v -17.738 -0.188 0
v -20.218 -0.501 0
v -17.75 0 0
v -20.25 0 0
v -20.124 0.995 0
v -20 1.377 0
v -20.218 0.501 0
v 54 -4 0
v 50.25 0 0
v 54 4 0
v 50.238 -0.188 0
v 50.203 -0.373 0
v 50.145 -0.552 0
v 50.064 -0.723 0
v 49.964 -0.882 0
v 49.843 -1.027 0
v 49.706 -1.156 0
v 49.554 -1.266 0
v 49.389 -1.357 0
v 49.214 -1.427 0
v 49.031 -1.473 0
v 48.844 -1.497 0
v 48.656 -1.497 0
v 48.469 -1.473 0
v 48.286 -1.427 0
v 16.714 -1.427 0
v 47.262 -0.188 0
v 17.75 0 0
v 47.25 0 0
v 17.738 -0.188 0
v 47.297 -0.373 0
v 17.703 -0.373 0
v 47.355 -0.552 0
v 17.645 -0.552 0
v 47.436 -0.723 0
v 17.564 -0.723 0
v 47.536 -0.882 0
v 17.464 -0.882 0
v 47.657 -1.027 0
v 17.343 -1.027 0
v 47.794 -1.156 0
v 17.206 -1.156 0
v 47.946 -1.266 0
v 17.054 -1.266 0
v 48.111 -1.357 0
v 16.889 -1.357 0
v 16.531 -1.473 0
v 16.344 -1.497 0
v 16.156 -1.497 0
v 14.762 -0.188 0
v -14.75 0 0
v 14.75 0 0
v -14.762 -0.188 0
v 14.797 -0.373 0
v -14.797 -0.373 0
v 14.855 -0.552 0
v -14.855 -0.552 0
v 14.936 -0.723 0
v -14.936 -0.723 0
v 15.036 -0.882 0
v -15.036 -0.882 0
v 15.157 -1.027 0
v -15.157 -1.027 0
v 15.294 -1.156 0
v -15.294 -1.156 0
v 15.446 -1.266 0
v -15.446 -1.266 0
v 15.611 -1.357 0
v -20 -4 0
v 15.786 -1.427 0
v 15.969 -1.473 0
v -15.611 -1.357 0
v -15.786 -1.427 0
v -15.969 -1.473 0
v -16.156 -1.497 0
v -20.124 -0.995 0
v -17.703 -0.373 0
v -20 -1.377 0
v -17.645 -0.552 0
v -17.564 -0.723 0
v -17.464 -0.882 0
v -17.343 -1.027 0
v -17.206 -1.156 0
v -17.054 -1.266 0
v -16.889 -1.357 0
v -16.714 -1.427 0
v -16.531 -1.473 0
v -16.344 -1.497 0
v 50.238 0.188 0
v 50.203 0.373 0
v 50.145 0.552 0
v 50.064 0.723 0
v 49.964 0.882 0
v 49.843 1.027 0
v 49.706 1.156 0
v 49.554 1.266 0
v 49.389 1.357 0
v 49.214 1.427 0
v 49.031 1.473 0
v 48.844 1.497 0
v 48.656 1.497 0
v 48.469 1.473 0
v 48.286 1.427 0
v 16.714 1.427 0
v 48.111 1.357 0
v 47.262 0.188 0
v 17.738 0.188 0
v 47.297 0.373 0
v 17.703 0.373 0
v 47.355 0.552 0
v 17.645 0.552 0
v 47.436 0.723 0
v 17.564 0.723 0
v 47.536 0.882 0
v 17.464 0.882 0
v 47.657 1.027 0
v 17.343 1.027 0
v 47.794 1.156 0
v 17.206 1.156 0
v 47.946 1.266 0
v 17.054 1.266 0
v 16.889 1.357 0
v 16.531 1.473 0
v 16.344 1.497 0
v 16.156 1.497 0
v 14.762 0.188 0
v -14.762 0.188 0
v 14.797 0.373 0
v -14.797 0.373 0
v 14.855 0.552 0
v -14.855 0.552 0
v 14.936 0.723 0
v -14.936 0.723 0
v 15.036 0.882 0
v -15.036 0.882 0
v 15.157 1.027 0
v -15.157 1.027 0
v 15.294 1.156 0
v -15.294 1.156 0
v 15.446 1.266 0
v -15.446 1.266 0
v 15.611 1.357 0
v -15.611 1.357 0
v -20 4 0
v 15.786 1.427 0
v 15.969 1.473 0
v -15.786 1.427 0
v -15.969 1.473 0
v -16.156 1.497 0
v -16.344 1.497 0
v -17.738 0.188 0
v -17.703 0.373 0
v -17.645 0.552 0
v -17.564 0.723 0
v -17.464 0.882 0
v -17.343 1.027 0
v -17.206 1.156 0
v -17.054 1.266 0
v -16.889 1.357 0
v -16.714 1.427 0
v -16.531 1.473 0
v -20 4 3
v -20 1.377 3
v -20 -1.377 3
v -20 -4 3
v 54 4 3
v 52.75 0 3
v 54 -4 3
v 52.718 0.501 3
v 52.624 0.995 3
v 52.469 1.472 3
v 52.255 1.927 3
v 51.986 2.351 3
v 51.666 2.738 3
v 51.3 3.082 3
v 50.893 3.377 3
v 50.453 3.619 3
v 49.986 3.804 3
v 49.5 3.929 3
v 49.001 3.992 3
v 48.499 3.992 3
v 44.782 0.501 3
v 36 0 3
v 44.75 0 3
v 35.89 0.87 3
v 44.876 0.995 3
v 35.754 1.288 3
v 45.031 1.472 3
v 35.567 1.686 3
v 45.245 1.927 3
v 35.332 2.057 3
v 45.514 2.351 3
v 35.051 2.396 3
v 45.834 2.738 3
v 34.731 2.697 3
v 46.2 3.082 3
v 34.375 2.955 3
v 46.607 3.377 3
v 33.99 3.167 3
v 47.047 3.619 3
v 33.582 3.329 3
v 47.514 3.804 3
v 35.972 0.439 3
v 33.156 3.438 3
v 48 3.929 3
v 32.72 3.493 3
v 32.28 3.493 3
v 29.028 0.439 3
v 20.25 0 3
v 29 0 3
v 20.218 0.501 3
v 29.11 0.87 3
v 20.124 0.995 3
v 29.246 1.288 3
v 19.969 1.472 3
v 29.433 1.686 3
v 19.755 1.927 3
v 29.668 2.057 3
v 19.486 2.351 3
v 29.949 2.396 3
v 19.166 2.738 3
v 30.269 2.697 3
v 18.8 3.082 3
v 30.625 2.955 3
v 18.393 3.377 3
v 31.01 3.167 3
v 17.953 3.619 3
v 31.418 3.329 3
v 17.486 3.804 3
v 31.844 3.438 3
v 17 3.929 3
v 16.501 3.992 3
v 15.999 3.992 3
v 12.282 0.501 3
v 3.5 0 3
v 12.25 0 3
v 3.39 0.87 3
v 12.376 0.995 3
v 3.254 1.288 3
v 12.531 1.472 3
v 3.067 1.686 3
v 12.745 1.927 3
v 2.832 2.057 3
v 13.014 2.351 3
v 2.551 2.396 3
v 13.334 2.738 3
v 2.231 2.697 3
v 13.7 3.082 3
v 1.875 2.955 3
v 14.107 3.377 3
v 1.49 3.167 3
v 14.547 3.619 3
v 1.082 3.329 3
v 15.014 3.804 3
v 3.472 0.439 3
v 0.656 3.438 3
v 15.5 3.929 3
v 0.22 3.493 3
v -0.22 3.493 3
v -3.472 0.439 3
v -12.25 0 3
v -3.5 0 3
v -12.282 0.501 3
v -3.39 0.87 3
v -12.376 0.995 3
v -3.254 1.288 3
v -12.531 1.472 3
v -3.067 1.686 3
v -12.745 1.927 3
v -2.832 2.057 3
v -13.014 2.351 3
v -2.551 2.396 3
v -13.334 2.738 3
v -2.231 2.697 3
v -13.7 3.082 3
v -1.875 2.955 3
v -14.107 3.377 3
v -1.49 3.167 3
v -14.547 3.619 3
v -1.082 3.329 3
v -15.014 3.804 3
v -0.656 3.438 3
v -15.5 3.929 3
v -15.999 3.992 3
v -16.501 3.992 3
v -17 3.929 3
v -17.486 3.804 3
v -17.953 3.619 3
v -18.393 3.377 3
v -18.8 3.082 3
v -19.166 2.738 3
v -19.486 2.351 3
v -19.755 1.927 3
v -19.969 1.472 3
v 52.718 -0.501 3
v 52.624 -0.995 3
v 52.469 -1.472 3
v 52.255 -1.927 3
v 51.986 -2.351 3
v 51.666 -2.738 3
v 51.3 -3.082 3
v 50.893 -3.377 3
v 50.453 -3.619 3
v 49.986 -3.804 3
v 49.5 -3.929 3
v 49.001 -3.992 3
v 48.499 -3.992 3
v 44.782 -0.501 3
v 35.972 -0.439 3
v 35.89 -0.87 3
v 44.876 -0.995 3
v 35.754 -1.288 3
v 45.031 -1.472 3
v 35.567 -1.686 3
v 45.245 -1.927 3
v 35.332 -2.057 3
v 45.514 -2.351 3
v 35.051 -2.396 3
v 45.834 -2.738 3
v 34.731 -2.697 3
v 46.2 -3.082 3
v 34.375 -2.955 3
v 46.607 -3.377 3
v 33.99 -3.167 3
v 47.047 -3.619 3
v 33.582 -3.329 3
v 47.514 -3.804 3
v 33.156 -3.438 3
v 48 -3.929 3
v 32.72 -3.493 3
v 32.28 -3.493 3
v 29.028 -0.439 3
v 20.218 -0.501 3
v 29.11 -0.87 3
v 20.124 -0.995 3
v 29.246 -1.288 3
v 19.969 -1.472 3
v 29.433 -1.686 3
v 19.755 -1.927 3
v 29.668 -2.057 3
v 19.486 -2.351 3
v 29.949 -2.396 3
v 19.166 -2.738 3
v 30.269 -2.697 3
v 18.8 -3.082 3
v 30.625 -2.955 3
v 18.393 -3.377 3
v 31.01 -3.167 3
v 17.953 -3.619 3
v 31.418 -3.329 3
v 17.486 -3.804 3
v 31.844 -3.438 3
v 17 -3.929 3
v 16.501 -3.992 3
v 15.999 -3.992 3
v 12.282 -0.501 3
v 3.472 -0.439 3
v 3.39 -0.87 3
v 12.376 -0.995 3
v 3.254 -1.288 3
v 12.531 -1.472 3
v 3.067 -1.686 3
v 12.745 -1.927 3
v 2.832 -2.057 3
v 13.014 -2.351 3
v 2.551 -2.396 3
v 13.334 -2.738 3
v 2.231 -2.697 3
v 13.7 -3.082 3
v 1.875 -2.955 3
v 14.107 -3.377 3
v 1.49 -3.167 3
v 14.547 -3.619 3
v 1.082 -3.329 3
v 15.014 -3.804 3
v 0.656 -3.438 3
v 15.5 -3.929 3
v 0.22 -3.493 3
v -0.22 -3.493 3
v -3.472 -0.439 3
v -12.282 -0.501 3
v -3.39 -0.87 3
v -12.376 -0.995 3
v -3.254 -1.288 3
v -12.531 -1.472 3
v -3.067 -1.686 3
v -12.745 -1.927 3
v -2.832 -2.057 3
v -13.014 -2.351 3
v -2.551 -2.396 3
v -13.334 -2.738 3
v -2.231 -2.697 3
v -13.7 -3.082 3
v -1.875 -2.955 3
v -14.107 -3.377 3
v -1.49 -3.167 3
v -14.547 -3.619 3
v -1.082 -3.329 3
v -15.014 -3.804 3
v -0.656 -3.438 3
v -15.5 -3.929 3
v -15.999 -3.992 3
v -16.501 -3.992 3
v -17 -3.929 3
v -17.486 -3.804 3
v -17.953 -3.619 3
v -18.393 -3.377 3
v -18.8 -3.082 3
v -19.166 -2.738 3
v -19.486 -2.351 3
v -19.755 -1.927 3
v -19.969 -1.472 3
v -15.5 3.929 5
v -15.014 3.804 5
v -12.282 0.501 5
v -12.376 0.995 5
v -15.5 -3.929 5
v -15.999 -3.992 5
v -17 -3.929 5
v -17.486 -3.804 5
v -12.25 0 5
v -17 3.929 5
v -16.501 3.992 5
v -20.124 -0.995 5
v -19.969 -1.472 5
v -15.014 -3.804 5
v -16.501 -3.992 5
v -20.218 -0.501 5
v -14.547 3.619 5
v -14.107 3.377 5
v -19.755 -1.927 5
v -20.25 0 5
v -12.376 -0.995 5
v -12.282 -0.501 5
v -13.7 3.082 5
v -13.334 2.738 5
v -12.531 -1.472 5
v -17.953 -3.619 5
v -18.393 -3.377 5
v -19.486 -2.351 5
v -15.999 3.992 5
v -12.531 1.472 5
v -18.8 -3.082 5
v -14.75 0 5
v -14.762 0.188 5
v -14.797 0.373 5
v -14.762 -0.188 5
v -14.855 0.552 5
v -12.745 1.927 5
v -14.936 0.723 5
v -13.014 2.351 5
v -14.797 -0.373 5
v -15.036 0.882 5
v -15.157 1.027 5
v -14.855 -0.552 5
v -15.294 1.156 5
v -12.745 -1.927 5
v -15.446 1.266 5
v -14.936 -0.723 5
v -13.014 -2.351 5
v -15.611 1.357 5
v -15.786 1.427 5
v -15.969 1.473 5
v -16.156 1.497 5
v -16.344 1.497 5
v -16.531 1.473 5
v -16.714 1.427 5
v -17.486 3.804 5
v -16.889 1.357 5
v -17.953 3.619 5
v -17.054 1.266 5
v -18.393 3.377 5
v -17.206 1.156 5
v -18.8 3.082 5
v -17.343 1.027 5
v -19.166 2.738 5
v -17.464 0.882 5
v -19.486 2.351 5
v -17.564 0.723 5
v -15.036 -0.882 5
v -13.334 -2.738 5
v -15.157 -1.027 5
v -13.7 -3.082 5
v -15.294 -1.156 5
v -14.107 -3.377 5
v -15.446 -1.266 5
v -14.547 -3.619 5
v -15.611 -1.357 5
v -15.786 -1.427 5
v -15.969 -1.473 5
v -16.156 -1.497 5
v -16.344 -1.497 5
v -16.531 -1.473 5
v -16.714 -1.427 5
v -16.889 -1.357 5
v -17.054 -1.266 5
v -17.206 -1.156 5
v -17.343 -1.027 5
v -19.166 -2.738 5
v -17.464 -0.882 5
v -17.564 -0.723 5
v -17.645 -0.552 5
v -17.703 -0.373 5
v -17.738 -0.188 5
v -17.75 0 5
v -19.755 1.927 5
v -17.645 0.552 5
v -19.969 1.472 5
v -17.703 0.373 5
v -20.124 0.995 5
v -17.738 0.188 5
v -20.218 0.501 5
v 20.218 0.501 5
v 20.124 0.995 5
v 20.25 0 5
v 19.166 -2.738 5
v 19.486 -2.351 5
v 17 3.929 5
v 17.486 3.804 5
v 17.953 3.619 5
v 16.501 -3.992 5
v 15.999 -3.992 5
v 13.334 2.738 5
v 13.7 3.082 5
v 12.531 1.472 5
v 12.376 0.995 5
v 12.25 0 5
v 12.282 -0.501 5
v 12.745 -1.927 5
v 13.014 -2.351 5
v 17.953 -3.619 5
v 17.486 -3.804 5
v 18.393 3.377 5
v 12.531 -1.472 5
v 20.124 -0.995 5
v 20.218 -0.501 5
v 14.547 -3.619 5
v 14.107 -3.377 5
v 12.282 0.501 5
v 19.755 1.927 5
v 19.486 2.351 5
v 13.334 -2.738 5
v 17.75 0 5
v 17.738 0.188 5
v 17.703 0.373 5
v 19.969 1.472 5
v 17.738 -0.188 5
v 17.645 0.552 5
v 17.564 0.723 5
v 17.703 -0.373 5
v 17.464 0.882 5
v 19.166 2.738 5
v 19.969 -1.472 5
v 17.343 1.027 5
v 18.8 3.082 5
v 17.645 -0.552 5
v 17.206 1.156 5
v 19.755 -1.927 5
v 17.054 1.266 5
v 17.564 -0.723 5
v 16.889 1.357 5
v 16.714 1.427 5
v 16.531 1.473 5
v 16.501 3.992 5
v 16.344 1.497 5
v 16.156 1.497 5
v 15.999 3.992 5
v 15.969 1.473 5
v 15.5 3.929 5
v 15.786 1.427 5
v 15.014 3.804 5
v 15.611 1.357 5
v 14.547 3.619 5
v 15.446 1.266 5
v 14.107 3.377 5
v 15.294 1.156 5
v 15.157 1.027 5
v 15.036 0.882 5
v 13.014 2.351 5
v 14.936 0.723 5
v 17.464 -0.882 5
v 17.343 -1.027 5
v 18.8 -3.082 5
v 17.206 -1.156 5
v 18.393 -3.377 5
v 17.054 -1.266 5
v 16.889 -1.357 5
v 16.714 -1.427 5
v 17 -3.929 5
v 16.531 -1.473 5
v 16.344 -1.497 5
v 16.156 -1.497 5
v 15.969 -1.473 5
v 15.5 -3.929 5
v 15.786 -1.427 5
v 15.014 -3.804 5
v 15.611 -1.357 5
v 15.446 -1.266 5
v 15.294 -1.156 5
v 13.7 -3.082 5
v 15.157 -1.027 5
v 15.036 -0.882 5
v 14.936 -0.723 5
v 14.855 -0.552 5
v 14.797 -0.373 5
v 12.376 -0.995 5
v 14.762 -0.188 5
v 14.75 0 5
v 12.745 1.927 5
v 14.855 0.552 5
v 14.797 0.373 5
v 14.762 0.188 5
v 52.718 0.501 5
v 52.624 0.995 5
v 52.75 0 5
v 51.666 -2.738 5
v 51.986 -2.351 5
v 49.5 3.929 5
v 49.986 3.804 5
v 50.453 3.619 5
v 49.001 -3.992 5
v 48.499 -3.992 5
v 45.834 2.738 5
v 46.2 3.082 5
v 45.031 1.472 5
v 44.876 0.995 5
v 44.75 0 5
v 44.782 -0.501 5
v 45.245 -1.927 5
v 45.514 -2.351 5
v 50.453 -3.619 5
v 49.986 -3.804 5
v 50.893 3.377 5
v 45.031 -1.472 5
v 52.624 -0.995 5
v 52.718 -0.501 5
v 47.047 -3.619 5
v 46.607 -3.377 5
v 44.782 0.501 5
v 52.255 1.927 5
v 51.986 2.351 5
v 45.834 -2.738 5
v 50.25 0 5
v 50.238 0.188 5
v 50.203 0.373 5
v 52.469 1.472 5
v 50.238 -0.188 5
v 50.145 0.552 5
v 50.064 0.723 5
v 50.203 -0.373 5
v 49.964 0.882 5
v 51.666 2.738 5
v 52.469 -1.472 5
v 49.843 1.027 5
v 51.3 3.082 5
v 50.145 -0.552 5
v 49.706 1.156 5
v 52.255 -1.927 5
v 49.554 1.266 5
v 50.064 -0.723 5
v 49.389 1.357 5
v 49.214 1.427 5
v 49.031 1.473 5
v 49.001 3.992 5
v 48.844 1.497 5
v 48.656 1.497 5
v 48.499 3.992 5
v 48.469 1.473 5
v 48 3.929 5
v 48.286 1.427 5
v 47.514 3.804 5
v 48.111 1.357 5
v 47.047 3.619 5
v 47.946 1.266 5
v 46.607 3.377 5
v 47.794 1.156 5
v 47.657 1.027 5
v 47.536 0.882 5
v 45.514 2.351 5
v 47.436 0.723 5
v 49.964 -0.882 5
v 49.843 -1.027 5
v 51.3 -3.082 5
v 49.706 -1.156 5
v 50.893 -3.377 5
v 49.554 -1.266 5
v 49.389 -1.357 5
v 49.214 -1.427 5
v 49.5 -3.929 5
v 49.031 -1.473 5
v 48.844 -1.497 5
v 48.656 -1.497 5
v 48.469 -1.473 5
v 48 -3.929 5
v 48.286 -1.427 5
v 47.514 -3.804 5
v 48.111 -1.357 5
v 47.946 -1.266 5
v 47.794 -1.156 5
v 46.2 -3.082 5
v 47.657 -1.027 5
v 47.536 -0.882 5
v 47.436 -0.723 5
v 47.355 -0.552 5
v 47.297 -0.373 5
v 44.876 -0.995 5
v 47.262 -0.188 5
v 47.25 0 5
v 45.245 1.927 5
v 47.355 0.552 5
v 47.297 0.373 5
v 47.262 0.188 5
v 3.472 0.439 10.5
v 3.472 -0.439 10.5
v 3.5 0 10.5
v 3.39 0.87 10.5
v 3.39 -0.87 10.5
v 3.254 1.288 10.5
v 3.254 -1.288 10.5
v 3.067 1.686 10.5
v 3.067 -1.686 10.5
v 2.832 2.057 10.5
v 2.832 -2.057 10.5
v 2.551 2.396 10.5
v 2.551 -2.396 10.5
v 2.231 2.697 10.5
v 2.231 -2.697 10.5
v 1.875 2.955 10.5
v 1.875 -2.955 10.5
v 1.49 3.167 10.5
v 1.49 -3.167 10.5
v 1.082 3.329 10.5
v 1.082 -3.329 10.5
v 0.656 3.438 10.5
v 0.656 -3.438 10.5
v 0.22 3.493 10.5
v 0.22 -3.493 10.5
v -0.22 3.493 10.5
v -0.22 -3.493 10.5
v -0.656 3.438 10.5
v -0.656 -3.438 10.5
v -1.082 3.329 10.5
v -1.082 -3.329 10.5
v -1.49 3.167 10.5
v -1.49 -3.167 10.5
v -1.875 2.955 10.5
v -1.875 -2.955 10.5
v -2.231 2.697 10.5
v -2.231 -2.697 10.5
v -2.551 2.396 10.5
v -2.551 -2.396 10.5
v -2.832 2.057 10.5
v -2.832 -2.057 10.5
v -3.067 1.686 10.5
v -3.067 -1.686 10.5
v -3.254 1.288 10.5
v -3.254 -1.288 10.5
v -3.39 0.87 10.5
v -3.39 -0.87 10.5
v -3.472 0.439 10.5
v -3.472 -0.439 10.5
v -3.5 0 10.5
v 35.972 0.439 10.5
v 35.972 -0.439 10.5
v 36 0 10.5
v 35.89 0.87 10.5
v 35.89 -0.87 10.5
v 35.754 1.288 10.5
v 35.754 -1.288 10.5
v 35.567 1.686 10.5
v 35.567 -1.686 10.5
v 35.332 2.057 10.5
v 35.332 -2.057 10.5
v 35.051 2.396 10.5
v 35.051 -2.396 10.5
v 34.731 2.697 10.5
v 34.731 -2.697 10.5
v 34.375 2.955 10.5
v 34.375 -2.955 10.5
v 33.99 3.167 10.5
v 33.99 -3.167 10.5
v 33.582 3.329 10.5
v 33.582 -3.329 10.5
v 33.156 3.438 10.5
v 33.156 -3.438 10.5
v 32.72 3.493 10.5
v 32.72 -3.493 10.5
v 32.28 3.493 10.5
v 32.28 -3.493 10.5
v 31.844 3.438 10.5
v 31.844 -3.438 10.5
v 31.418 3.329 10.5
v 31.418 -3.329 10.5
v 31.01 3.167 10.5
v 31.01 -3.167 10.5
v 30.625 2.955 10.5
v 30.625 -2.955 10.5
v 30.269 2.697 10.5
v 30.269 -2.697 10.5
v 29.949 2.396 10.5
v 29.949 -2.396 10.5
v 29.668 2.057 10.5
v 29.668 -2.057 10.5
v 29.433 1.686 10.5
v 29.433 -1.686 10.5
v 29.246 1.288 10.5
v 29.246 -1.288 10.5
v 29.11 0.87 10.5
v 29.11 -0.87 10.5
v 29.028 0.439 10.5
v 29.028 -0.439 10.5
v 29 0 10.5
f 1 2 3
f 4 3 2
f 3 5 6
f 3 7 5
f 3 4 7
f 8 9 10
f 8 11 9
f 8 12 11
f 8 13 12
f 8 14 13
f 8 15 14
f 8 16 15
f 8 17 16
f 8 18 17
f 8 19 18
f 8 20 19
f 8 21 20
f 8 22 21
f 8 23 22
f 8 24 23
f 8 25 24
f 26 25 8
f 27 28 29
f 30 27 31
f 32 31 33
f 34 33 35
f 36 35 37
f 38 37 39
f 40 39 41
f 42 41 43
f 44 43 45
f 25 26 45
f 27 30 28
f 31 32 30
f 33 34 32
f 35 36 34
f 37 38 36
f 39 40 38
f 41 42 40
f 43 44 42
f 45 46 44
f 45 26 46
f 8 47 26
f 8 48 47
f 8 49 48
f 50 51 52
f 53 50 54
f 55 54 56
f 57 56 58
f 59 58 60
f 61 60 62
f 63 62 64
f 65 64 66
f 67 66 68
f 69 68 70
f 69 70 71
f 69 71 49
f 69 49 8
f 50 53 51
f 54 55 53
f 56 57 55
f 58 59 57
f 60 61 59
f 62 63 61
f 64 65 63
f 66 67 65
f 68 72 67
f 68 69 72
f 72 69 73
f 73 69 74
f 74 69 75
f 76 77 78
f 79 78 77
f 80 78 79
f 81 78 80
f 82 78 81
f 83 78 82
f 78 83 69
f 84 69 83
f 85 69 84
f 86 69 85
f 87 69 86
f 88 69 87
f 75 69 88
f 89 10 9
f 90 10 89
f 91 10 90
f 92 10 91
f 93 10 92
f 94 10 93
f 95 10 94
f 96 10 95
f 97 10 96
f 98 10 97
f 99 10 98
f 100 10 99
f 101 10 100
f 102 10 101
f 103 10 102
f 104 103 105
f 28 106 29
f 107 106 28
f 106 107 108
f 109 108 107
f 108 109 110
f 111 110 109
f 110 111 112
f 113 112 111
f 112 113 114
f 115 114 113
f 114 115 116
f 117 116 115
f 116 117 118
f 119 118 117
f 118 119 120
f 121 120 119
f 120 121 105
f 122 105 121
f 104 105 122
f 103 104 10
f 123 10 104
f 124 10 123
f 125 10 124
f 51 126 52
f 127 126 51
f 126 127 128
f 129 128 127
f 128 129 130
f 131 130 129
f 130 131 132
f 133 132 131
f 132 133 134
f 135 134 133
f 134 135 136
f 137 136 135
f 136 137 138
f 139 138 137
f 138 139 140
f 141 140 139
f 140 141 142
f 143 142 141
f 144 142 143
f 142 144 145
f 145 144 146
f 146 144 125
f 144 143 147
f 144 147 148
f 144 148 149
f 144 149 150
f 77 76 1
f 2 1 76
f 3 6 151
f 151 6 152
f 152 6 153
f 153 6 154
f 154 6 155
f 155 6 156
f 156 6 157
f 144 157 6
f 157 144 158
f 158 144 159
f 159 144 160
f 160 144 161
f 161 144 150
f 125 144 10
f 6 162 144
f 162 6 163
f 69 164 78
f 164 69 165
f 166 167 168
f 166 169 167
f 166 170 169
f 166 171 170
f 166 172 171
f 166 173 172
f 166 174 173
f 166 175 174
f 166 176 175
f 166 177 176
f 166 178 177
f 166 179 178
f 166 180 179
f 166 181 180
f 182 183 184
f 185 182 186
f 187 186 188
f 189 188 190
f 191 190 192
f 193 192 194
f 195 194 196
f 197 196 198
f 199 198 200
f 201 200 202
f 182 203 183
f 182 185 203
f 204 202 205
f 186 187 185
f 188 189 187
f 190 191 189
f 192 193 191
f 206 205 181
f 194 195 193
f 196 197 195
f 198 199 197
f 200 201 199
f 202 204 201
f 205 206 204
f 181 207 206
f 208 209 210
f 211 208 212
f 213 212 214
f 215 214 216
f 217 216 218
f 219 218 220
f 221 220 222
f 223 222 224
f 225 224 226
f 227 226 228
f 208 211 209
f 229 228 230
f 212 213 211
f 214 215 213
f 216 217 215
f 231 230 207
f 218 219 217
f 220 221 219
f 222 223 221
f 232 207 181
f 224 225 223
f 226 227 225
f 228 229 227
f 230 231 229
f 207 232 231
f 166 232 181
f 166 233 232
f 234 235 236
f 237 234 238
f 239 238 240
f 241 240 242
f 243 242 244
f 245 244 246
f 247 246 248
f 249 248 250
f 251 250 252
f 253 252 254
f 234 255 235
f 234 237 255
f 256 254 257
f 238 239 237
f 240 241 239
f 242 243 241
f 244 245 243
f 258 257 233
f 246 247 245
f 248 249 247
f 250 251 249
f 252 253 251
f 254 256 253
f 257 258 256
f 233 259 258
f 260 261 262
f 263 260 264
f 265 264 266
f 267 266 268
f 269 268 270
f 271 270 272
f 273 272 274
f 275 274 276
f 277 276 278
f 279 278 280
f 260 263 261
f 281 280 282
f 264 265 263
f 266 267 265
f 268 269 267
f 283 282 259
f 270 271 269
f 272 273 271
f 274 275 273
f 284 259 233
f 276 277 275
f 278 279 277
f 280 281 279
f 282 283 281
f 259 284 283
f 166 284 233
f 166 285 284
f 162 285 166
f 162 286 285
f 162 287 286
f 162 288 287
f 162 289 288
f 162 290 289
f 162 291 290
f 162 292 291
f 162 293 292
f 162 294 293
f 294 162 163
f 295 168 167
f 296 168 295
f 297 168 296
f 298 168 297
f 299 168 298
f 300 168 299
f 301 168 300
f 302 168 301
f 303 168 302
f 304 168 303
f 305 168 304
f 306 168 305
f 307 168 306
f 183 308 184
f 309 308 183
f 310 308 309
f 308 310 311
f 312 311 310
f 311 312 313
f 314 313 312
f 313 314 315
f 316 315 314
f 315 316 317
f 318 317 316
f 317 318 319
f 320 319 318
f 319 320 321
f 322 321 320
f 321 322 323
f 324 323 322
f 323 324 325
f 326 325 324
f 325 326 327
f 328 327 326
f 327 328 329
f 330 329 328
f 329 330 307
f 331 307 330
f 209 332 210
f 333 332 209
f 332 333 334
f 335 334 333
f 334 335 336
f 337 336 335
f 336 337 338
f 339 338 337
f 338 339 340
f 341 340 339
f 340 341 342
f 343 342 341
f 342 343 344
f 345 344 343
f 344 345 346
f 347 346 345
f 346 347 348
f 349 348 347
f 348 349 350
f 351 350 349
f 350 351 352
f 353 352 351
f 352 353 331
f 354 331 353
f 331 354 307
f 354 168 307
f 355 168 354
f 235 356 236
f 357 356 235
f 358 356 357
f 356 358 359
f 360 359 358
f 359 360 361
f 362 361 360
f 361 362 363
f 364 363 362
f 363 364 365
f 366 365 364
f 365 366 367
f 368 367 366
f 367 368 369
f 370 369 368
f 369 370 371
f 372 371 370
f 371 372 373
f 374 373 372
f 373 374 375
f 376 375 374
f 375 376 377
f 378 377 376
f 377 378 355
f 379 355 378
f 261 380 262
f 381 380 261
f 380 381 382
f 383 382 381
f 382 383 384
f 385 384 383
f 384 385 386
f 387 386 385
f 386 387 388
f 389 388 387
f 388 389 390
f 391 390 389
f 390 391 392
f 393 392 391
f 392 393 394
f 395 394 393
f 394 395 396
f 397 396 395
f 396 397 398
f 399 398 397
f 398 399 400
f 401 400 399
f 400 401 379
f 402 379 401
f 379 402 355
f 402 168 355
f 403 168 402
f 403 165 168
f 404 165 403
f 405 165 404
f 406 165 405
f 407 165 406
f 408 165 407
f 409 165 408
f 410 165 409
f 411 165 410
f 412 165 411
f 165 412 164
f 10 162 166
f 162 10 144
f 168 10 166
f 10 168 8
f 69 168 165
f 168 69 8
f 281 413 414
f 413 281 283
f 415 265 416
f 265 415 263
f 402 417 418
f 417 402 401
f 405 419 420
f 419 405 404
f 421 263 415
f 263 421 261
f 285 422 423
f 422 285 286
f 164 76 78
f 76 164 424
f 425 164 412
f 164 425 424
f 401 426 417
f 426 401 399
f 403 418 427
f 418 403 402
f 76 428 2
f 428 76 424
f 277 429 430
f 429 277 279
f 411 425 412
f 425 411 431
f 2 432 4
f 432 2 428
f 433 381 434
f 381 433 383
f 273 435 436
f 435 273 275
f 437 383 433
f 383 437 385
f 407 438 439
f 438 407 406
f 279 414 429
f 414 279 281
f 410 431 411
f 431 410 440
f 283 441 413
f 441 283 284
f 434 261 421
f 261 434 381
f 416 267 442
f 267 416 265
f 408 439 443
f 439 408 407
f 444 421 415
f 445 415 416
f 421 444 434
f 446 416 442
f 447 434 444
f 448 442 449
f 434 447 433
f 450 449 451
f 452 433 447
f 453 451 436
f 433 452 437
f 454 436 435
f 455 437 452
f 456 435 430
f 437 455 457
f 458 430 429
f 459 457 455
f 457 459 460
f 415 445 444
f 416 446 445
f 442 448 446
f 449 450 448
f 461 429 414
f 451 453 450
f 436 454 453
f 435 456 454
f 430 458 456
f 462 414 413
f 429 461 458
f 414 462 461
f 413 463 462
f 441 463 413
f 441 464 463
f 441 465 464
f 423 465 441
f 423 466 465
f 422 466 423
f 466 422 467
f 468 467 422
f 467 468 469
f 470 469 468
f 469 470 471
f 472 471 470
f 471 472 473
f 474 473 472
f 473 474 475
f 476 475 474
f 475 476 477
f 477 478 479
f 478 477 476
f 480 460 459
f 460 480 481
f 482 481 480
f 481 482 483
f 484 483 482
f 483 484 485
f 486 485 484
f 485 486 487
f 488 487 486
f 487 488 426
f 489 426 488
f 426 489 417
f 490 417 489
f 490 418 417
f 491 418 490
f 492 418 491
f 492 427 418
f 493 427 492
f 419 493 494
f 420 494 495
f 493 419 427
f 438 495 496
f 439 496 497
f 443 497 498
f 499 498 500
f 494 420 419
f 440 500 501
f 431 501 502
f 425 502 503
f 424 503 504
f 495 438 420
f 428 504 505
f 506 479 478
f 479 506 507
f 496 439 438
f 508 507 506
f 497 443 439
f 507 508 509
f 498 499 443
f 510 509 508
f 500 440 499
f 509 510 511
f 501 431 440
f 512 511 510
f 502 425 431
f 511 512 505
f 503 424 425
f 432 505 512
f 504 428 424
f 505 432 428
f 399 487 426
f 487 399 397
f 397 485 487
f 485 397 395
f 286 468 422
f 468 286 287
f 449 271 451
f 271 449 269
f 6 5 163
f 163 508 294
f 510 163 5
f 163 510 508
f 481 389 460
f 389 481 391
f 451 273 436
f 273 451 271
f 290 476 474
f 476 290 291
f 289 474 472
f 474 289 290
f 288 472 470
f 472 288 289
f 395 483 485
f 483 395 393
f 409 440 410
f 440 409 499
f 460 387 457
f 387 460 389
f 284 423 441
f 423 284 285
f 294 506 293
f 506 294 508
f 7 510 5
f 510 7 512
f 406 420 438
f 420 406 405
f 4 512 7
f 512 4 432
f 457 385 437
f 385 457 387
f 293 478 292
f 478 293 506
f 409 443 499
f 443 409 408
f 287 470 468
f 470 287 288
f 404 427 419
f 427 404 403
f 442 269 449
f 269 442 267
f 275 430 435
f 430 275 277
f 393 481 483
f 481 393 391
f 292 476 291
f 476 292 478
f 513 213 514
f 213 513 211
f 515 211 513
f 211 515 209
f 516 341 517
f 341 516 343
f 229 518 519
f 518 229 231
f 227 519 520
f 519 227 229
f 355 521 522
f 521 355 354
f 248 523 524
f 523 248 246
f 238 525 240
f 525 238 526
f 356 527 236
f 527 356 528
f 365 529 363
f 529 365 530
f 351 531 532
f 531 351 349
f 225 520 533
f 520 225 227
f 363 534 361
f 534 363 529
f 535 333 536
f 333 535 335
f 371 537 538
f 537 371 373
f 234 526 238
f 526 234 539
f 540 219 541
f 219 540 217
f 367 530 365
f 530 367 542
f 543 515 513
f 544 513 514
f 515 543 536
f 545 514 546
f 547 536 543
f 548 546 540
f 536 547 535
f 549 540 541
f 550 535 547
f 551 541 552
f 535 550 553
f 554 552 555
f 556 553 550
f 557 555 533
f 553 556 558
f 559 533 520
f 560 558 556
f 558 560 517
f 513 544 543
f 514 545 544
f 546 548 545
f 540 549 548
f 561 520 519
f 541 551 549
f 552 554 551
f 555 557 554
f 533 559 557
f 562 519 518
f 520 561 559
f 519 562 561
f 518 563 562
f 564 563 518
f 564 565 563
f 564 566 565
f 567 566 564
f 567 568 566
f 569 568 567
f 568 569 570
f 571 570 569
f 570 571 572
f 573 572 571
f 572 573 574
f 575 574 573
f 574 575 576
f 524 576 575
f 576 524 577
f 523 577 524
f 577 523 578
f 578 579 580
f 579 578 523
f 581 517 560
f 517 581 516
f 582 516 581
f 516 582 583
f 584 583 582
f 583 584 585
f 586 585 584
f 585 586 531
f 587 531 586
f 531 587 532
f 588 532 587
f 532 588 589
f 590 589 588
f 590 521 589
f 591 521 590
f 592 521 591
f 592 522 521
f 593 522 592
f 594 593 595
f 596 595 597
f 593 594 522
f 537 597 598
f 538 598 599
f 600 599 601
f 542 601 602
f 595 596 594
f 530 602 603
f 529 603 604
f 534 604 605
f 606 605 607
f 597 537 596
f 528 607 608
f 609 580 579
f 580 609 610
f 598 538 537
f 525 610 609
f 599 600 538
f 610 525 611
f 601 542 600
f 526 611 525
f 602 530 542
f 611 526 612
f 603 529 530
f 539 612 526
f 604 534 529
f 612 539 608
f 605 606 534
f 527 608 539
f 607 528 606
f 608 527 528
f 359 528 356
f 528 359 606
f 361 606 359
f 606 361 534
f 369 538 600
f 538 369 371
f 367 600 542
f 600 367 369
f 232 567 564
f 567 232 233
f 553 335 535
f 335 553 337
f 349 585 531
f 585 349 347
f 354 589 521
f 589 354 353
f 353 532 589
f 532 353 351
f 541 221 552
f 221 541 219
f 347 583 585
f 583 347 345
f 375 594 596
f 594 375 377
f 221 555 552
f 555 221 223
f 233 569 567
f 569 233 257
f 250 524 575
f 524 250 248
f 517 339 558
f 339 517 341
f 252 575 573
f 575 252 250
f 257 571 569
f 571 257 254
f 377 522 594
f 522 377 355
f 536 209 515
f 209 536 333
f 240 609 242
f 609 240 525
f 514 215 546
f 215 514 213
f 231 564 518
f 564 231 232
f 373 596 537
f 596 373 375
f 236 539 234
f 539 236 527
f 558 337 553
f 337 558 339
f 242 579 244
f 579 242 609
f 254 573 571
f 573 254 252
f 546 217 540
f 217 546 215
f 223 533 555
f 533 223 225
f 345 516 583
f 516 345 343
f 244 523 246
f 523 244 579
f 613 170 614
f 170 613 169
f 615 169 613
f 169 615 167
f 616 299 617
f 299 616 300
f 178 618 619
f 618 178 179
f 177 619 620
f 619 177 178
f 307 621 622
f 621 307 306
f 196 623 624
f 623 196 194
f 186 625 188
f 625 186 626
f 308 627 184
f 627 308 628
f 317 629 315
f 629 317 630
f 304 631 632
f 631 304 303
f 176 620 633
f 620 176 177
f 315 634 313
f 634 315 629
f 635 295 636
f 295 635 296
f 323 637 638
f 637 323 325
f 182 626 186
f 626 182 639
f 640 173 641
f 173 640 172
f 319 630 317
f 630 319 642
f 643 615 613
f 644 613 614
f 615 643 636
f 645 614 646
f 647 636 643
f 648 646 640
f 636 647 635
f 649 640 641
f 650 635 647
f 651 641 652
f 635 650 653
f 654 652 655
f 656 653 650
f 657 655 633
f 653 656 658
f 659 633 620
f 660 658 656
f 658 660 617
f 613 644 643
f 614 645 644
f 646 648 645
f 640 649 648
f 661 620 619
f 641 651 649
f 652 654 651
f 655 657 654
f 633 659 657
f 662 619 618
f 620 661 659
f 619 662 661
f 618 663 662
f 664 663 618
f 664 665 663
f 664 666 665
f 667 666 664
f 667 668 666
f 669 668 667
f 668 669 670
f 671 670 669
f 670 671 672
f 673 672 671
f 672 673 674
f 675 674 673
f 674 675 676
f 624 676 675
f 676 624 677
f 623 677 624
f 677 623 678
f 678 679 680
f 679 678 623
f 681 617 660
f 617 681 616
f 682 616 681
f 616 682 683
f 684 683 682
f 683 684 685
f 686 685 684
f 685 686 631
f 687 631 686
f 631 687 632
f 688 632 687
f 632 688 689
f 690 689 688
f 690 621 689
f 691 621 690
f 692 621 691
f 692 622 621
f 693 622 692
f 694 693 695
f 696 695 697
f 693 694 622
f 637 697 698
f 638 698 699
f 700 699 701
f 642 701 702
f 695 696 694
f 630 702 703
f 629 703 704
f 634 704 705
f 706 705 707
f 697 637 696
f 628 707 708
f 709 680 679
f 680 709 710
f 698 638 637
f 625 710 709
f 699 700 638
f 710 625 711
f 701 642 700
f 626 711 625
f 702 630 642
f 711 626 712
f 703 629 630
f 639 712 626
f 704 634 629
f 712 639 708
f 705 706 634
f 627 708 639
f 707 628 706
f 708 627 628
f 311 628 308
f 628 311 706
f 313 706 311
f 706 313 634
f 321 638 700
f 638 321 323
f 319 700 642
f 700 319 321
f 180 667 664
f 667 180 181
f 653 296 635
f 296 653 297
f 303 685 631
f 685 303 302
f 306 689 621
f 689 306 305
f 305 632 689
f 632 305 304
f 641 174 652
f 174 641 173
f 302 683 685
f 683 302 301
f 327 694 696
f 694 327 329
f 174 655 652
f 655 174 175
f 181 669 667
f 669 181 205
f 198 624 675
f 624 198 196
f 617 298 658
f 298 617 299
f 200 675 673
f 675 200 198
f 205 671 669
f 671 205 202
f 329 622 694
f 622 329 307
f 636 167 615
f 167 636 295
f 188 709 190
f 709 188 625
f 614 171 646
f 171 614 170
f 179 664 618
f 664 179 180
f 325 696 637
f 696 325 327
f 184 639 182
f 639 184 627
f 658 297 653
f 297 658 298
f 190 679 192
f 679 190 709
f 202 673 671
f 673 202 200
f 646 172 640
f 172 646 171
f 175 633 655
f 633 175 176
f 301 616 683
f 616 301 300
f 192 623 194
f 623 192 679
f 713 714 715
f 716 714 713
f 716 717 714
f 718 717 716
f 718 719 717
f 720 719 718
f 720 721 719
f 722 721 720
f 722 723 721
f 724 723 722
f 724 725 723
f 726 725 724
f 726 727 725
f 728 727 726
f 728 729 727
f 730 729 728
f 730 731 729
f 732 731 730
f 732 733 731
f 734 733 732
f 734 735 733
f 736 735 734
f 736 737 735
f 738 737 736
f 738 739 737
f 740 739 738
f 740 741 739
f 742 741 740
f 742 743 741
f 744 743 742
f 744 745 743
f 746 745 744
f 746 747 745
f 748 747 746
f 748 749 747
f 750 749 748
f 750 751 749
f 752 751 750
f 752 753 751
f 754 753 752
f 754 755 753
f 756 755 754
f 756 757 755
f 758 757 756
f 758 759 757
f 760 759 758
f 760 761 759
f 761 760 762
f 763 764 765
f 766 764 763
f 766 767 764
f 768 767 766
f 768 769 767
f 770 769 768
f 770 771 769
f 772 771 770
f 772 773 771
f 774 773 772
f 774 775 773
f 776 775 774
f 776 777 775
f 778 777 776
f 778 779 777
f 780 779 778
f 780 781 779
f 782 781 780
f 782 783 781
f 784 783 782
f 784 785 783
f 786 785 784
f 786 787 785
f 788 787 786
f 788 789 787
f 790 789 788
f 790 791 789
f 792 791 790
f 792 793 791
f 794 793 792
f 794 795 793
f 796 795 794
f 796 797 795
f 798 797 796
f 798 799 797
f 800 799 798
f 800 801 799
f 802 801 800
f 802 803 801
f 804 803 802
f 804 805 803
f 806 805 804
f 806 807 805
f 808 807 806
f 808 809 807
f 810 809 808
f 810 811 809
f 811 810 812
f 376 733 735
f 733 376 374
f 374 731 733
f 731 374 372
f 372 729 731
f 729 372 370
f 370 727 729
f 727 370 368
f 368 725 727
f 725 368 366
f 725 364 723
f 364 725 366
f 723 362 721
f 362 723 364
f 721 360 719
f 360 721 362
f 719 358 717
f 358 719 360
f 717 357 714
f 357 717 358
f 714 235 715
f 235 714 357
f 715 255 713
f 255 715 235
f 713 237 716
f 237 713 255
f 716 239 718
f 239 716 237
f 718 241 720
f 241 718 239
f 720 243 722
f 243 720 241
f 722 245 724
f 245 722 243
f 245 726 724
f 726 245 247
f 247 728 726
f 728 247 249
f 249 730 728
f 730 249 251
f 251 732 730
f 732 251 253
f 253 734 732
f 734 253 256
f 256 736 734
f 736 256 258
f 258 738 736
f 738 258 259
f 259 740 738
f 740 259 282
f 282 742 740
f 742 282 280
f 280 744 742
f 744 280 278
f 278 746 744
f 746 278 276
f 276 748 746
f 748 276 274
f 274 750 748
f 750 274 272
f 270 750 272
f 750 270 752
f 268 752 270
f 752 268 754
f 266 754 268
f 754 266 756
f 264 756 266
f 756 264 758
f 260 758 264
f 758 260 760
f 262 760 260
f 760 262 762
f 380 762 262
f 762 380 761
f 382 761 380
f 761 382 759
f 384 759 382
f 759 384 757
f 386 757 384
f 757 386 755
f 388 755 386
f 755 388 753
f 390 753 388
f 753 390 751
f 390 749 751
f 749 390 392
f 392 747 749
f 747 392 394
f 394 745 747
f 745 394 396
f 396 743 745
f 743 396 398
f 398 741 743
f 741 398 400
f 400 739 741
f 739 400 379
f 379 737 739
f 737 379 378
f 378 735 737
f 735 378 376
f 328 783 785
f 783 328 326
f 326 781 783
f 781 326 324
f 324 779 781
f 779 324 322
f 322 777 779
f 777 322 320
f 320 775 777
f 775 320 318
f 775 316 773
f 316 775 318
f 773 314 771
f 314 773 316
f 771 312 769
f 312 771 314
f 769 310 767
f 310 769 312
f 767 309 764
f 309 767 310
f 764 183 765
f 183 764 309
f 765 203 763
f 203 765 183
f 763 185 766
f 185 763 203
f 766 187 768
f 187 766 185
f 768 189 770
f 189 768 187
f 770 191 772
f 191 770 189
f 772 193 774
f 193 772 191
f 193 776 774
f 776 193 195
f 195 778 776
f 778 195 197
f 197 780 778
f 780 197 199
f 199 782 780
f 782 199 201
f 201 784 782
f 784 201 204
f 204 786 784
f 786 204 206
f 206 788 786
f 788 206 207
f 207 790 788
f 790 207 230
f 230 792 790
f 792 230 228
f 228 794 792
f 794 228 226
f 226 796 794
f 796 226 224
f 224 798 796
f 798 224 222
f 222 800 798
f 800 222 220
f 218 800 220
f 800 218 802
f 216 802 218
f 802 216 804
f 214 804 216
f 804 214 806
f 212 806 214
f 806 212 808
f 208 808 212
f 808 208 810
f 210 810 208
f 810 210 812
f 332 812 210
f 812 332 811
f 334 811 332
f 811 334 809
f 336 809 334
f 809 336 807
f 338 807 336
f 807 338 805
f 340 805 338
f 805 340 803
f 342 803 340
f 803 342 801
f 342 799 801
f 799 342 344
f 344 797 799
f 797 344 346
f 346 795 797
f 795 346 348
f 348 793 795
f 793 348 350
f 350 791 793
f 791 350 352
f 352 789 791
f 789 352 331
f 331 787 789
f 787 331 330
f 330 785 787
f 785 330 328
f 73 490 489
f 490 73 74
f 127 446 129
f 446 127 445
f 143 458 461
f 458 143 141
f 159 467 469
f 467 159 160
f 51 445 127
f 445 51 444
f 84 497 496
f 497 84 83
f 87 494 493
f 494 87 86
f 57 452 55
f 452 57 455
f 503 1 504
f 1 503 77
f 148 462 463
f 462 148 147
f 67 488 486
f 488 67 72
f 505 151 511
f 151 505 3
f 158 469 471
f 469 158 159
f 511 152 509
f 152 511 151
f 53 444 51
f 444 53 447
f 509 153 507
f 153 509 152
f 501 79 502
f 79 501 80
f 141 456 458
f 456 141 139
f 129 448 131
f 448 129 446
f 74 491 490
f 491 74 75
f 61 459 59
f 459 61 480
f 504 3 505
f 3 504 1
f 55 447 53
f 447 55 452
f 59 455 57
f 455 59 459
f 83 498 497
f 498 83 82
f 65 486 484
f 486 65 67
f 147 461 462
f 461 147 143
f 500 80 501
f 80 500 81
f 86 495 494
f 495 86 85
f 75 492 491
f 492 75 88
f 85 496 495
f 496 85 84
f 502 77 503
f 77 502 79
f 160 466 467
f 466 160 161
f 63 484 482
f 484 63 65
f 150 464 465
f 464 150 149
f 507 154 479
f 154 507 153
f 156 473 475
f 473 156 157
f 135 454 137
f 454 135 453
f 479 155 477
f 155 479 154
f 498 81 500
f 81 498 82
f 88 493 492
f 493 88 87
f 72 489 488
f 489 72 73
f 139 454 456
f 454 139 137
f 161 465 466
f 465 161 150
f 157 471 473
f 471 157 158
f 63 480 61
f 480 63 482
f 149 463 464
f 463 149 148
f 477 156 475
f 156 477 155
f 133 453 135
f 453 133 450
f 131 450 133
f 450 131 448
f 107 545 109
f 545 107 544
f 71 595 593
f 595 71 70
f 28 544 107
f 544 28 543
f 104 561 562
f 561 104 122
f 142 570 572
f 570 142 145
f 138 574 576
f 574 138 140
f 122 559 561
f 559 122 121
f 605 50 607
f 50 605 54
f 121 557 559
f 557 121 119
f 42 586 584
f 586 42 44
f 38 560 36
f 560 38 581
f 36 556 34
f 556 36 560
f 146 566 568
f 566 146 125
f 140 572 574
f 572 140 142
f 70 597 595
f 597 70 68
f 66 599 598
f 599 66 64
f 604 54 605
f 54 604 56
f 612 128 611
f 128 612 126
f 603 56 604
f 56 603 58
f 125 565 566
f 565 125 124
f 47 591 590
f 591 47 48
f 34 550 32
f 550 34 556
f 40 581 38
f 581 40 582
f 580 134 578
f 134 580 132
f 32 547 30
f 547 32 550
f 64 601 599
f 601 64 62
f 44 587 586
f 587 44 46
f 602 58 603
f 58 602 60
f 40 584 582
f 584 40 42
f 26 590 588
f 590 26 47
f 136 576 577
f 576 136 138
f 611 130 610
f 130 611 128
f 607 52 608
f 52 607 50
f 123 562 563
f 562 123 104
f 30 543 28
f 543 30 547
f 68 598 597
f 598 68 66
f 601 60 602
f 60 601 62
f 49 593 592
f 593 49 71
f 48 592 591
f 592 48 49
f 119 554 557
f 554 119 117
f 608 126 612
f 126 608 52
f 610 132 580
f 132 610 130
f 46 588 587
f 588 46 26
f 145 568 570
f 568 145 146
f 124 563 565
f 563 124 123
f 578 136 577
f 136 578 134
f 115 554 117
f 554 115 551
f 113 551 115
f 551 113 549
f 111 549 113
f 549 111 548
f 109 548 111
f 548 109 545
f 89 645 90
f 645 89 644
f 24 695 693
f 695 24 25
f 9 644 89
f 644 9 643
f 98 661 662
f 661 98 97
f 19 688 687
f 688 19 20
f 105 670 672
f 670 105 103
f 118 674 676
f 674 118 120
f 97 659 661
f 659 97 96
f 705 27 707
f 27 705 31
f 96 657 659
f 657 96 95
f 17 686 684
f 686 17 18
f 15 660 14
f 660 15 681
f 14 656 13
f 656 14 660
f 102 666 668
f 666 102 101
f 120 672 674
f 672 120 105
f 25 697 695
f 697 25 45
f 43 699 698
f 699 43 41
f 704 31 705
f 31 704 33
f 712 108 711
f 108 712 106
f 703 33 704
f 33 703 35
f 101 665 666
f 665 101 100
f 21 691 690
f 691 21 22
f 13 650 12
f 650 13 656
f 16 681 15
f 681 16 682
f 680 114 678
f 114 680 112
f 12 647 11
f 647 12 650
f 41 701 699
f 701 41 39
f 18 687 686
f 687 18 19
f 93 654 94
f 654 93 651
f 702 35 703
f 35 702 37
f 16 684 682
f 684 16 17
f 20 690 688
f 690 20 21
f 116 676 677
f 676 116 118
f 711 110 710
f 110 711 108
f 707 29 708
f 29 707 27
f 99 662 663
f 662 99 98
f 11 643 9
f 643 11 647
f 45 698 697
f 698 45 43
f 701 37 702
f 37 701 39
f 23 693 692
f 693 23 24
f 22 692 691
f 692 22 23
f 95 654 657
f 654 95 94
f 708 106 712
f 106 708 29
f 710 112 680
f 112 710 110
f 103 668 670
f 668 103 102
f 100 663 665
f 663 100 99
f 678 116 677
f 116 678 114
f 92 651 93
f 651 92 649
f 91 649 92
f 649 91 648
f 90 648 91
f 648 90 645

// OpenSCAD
$fn = 50;

width = 15;

module box() {
    linear_extrude(height=3)
    translate([-40/2, -4])
    square([17.5 + width + 16.5 + width + 10, 8]);
    
    translate([-(17.5+width)/2, 0])
    nut();
    translate([(17.5+width)/2, 0])
    nut();
    translate([17.5+width+(17.5+width)/2, 0])
    nut();
    
    linear_extrude(height=7.5+3)
    union() {
        circle(d=7);
        translate([17.5 + width, 0])
        circle(d=7);
    }
}

module nut() {
    linear_extrude(height=3+2)
    circle(d=8);
}

module nut_hole() {
    linear_extrude(height=3+2)
    circle(d=3);
}

module nut_holes() {
    translate([-(17.5+width)/2, 0])
    nut_hole();
    translate([(17.5+width)/2, 0])
    nut_hole();
    translate([17.5+width+(17.5+width)/2, 0])
    nut_hole();
}

difference() {
    box();
    nut_holes();
}
